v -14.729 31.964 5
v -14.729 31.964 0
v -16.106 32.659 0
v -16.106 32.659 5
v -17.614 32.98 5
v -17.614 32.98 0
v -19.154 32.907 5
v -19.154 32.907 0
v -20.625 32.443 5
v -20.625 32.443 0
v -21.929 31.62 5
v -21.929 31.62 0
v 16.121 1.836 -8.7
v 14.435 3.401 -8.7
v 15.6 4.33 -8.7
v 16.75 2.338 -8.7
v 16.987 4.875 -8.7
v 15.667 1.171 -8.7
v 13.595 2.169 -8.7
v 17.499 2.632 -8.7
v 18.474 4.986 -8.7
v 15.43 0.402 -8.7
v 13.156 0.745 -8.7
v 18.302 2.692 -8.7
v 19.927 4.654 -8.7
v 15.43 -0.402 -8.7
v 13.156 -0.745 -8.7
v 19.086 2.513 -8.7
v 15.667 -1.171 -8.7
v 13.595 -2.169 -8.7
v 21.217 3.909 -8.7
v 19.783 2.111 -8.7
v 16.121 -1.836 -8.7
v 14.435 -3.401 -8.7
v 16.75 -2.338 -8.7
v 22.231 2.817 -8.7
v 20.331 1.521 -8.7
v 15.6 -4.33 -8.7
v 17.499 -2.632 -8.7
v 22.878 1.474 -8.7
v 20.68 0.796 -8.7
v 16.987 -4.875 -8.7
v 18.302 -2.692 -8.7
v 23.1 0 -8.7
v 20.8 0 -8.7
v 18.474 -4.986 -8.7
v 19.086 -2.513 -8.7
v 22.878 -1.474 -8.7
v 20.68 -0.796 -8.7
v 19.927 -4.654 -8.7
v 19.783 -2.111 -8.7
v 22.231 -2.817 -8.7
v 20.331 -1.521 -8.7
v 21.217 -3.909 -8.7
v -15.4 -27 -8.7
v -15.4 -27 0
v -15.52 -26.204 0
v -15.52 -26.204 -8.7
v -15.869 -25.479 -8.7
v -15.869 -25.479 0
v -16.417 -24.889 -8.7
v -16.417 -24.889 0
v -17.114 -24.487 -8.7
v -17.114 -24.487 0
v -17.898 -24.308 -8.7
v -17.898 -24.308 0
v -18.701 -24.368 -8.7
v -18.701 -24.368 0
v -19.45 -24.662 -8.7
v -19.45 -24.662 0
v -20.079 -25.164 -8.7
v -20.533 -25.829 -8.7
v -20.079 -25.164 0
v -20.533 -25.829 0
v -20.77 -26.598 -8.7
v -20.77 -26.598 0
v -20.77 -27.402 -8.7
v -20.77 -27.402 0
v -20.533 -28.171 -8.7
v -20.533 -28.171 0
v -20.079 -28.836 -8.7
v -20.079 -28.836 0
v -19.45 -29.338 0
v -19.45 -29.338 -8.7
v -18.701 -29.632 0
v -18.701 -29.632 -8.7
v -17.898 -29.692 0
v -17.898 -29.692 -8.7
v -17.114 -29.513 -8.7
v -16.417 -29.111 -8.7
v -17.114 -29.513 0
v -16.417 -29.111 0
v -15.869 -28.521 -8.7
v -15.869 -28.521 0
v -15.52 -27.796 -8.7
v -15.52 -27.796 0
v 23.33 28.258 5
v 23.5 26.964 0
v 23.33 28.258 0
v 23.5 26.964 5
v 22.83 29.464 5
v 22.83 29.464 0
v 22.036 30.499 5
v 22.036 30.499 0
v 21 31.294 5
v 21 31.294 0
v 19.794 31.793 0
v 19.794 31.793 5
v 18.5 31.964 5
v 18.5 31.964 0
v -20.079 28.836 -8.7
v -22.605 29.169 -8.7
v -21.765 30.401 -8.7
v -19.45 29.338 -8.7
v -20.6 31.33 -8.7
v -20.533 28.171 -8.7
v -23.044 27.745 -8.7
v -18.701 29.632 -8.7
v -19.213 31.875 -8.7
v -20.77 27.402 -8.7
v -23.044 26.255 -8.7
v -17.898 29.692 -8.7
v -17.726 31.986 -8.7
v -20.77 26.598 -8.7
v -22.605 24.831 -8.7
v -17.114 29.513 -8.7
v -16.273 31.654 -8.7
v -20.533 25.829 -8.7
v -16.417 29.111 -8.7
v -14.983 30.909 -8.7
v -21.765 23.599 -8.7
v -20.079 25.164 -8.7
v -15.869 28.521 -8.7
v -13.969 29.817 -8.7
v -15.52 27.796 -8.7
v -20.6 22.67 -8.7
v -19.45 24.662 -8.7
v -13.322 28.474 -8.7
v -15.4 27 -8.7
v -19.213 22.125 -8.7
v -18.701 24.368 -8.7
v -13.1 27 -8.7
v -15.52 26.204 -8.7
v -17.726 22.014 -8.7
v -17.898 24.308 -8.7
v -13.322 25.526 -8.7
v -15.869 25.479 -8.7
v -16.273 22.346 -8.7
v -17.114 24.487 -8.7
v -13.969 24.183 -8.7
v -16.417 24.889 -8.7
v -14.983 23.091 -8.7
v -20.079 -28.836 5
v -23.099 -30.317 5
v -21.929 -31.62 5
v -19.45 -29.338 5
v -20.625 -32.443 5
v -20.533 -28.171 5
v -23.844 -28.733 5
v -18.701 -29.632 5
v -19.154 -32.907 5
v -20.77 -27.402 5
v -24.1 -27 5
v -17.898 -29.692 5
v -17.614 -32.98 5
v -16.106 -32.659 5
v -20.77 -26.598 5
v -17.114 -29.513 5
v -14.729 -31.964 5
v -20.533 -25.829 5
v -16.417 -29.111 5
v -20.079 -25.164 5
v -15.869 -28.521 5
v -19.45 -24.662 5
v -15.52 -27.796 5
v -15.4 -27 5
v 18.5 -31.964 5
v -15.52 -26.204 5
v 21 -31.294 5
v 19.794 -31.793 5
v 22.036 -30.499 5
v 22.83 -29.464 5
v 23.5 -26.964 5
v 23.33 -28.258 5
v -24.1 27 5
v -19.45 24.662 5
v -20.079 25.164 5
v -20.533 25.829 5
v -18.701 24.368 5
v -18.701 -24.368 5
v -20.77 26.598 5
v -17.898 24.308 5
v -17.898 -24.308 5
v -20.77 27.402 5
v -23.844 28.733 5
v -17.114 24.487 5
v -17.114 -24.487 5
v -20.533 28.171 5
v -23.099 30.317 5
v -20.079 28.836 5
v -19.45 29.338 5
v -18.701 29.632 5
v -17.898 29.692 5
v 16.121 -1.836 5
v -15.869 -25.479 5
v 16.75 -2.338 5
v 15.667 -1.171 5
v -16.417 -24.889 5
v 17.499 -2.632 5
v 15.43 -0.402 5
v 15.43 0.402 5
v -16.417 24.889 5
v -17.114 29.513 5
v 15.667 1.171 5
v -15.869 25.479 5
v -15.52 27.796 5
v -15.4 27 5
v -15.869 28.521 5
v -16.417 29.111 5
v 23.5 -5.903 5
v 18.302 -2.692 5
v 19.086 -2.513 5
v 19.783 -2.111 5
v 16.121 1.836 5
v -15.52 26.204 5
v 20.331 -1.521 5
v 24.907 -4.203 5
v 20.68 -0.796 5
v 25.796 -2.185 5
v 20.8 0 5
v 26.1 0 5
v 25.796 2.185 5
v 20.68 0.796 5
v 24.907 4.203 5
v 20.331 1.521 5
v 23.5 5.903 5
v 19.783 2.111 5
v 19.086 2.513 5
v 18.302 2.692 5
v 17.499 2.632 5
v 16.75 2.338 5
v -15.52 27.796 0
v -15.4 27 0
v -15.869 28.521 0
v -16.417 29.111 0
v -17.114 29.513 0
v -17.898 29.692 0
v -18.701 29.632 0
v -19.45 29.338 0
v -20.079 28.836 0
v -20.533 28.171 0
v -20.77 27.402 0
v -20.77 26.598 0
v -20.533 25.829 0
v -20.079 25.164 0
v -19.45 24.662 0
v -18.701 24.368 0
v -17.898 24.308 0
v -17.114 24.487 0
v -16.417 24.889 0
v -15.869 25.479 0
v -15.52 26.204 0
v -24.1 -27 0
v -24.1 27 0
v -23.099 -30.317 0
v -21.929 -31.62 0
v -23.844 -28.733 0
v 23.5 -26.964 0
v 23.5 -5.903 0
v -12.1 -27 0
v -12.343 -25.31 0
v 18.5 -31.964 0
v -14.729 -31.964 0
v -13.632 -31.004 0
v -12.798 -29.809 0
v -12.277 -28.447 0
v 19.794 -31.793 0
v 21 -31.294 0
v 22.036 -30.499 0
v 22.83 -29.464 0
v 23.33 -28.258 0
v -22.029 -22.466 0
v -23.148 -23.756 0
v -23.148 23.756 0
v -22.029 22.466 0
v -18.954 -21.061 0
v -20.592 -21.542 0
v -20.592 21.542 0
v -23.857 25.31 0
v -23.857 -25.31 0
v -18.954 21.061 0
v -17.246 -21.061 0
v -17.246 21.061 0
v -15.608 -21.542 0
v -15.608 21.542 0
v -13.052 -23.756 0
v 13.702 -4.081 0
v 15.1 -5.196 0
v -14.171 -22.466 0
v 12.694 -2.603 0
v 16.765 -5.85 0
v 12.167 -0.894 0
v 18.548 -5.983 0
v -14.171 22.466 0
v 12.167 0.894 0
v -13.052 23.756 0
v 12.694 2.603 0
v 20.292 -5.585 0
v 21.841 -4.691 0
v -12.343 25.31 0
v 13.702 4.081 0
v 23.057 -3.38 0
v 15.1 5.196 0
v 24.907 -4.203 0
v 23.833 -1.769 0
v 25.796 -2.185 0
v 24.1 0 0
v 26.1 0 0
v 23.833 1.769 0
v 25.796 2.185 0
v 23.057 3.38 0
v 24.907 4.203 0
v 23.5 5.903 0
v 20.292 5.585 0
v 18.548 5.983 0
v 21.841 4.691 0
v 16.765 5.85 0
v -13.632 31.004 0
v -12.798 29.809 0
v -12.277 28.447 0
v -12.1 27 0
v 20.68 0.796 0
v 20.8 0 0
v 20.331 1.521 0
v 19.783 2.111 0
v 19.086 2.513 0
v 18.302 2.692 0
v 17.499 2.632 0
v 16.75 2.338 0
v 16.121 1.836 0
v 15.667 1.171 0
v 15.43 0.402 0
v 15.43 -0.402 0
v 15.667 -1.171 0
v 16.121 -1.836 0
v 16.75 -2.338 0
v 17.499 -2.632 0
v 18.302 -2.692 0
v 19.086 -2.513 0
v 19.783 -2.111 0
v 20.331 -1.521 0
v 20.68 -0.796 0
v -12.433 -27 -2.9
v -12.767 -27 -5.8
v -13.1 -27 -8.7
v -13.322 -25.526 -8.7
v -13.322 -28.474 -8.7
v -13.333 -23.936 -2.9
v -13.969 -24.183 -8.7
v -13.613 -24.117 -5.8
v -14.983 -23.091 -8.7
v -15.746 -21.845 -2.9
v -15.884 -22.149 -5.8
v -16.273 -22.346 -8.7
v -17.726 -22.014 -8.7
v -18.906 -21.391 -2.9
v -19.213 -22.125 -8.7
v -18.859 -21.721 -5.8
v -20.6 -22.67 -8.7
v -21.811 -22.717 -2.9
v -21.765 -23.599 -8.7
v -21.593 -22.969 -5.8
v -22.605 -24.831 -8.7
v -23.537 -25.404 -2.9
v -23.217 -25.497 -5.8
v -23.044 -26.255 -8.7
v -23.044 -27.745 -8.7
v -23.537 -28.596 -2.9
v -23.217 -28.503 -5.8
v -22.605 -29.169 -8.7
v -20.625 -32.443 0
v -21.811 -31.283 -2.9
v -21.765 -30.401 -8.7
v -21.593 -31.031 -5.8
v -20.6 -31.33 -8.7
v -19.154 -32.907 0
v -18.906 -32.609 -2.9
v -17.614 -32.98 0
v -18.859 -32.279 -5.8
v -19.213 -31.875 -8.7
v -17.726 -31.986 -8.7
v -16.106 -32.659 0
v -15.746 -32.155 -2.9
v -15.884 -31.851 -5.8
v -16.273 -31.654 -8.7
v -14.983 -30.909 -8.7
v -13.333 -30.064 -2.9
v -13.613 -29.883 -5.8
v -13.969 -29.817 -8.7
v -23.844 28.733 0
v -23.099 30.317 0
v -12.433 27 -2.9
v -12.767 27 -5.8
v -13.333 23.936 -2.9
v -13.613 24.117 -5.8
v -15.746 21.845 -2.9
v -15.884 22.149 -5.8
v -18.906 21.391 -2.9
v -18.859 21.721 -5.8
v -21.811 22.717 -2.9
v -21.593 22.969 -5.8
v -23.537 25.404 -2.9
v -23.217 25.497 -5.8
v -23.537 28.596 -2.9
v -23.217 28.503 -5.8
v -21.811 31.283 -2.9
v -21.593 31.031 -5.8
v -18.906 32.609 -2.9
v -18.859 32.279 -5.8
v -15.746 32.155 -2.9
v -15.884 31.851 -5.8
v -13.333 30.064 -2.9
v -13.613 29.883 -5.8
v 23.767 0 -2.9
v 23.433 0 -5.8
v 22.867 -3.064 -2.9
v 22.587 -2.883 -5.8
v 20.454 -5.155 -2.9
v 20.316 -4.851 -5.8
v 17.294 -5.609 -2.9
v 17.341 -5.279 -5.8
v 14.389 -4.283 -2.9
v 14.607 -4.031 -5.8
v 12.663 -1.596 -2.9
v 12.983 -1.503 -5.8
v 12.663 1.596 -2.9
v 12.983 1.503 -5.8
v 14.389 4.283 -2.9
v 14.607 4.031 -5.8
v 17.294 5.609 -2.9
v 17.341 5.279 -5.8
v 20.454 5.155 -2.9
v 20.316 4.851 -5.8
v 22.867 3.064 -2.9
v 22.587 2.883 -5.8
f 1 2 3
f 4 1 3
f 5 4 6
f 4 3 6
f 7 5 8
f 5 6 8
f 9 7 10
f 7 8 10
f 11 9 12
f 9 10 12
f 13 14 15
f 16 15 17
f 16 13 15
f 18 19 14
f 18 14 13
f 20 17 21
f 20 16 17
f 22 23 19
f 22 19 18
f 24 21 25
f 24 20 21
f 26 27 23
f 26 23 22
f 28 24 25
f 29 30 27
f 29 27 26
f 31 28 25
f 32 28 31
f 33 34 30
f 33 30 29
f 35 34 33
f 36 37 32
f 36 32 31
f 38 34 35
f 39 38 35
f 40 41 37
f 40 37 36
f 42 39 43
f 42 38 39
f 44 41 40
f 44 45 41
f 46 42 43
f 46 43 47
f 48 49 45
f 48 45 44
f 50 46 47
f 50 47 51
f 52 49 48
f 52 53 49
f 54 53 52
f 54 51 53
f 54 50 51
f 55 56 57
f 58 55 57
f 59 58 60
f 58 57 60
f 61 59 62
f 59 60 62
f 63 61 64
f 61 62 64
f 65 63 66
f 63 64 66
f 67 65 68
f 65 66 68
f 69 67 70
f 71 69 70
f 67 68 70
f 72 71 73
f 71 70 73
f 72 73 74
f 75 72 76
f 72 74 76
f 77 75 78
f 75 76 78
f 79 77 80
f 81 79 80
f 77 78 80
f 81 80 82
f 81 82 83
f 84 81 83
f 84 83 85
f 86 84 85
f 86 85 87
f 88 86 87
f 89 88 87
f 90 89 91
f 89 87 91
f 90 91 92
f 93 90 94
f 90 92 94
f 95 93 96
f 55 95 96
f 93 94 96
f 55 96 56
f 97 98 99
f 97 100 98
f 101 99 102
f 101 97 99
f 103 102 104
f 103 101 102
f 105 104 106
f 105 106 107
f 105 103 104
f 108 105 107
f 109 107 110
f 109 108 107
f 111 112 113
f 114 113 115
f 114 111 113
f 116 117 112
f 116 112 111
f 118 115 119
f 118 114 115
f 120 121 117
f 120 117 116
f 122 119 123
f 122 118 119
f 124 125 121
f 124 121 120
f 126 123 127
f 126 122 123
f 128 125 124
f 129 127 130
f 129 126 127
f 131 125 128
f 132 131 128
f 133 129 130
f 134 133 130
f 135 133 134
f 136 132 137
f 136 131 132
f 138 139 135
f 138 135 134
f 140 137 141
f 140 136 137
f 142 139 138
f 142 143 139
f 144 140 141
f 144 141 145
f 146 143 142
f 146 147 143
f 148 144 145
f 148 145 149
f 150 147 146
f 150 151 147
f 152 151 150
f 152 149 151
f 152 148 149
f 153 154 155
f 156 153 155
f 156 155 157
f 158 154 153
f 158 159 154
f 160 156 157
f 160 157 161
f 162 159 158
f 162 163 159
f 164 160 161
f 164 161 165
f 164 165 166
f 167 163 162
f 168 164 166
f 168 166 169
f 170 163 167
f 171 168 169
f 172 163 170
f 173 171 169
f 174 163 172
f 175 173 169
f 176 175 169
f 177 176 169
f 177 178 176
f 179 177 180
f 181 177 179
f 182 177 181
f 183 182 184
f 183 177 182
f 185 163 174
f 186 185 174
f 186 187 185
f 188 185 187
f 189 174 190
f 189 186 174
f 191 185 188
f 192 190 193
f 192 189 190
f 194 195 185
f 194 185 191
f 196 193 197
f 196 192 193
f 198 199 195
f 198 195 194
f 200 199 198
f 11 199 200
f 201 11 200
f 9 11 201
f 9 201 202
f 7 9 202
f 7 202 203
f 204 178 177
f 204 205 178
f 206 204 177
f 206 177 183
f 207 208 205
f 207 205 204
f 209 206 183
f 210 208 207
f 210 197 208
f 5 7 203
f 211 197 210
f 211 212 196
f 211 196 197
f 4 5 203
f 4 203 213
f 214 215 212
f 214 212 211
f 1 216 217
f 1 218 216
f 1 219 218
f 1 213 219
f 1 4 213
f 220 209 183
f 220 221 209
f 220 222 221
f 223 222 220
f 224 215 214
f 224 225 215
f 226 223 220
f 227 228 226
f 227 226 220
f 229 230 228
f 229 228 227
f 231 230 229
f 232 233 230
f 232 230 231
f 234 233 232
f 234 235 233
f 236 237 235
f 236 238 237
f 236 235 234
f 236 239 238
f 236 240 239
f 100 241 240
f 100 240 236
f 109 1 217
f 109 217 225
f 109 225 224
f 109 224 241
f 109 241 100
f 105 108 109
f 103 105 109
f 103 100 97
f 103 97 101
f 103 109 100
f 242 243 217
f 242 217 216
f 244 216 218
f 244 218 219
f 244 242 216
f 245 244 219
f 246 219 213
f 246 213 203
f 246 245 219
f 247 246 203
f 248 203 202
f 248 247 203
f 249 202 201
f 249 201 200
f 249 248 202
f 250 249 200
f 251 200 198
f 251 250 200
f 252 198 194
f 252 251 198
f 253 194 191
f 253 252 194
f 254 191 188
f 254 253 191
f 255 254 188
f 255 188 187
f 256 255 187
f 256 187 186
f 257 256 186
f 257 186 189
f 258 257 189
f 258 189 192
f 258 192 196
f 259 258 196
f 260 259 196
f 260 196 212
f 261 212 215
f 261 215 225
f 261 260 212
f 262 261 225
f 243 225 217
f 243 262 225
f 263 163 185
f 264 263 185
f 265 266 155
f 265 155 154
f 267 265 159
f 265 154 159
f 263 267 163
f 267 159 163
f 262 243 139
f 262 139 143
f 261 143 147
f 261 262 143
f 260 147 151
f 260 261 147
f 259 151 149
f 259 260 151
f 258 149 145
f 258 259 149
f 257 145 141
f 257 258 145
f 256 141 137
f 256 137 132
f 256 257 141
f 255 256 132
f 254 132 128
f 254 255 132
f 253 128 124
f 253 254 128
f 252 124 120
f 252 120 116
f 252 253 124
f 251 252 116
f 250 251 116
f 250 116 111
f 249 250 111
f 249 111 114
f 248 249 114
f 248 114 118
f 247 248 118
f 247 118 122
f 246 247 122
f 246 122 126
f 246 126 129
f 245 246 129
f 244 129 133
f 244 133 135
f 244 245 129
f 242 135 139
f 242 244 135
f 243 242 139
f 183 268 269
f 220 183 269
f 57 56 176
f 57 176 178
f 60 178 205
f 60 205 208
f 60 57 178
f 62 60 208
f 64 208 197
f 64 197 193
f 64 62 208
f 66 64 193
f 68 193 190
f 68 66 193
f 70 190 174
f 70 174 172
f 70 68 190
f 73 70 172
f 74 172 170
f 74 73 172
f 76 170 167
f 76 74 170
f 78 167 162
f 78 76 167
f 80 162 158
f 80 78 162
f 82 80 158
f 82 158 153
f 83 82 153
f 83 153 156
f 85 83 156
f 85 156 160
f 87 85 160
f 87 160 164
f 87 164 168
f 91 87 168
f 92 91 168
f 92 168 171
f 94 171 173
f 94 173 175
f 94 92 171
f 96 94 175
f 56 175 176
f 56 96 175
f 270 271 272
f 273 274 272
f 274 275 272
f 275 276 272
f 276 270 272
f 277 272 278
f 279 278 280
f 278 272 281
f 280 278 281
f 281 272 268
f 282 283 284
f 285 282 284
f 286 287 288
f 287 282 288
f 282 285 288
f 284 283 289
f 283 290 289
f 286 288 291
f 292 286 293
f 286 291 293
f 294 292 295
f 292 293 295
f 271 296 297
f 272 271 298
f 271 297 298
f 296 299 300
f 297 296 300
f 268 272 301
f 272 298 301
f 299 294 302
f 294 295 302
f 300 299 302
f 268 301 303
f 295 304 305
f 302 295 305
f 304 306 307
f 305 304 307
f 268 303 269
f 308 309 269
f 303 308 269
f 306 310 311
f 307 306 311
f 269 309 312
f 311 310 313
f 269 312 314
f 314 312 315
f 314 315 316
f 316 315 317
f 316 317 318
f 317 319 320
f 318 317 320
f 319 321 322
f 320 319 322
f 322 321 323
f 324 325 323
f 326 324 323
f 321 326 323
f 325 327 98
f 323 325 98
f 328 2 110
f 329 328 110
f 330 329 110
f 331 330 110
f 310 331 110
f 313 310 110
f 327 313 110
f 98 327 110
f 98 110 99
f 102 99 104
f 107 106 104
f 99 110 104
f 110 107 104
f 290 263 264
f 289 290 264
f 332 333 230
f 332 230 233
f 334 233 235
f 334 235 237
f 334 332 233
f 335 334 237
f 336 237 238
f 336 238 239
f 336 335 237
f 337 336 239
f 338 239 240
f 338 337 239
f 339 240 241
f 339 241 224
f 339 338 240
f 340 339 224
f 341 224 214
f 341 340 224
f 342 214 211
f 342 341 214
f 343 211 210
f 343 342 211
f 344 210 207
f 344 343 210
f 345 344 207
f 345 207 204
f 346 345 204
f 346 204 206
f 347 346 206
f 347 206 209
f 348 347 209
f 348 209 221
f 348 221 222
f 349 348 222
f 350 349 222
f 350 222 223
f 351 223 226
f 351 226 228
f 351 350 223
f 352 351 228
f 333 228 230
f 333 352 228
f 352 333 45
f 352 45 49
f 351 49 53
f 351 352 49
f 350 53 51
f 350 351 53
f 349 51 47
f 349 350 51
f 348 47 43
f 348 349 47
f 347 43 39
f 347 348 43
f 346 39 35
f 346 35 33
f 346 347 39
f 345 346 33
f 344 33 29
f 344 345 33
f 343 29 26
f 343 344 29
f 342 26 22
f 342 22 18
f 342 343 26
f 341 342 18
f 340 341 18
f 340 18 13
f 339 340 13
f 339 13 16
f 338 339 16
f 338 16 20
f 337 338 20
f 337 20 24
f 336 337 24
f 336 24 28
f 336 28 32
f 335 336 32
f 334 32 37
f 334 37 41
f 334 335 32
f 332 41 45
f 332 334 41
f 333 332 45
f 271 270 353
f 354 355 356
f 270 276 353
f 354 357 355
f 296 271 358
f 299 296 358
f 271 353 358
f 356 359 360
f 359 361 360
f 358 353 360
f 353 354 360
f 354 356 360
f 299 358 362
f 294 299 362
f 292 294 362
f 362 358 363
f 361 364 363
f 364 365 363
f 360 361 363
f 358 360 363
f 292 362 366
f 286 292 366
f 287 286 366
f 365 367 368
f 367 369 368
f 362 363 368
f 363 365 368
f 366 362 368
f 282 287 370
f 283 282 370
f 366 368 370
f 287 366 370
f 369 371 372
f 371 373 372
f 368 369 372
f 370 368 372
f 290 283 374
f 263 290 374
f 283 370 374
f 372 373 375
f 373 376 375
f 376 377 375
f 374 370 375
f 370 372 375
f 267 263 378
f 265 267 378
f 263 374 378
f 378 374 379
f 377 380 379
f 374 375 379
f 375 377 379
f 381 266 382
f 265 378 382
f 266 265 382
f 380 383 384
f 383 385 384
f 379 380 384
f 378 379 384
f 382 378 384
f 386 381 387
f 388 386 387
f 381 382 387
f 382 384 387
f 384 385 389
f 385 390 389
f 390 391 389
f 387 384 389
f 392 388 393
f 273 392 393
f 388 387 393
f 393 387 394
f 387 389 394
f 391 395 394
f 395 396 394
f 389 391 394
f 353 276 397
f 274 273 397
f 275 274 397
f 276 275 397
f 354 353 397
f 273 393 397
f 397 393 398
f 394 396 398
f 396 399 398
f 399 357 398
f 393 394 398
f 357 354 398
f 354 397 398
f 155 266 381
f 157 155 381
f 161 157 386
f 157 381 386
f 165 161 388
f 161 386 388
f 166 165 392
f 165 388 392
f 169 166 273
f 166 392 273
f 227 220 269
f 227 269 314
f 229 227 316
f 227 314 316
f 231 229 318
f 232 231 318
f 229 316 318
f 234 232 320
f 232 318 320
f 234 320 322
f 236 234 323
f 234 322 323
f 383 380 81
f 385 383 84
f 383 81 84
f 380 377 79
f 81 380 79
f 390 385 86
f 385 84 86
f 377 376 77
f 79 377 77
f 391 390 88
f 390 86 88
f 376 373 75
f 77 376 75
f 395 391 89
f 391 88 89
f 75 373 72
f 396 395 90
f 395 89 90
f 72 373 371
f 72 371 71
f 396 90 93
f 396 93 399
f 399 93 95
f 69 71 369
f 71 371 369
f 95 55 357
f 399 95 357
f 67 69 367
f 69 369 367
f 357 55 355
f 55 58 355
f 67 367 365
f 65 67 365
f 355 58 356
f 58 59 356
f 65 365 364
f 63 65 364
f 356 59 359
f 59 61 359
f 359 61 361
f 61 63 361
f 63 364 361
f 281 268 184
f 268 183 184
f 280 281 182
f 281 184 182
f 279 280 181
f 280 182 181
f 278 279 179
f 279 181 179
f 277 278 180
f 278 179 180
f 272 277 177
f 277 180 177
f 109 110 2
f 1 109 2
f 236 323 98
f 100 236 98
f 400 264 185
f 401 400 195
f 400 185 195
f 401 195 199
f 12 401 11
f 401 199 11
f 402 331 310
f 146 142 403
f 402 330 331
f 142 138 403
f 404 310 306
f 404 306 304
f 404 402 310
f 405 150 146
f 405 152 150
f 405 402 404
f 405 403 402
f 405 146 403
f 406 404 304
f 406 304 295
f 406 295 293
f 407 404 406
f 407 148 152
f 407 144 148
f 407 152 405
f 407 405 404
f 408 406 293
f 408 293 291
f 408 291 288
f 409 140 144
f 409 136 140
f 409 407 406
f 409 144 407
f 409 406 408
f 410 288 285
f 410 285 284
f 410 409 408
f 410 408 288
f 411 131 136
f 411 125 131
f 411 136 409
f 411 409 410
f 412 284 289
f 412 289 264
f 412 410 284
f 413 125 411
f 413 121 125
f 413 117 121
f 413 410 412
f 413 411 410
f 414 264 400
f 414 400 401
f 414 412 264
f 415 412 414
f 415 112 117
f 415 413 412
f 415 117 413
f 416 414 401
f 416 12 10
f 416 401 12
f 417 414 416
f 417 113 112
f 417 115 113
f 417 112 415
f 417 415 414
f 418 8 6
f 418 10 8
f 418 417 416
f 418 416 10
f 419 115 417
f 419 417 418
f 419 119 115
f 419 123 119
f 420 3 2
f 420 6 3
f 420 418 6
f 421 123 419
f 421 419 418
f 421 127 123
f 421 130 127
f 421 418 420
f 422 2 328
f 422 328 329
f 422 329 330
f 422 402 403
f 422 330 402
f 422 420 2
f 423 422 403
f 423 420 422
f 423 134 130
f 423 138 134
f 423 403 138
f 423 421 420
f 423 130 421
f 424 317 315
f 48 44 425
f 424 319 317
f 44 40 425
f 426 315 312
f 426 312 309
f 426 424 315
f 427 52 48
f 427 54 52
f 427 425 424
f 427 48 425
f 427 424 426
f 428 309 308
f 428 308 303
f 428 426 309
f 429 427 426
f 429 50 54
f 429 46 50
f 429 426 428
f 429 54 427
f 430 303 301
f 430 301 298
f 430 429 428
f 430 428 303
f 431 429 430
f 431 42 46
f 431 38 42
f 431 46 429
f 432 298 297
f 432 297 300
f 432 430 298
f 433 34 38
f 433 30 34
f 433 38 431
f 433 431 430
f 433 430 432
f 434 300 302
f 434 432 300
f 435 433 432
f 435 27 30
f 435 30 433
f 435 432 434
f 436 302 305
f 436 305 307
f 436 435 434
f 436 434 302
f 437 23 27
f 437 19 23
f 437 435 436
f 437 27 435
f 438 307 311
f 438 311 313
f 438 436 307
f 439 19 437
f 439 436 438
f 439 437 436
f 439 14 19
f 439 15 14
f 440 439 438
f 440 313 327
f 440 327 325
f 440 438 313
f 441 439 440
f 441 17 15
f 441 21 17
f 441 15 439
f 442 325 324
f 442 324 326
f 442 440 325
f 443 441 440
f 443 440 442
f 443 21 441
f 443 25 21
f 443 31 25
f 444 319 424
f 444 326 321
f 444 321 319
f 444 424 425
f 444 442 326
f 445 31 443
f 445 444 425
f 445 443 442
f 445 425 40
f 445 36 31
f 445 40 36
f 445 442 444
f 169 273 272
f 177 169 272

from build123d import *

# Parameters (mm, degrees)
SKETCH_1_R          = 2.2
SKETCH_1_R_2        = 2.7
EXTRUDE_1_DEPTH     = 5
CUT_EXTRUDE_1_REACH = 59.46
EXTRUDE_START       = -5
SKETCH_6_R          = 2.7
EXTRUDE_3_DEPTH     = 5
FILLET_1_R          = 5


with BuildPart() as part:
    # 草图1 → 凸台-拉伸1 (new body)
    with BuildSketch(Plane.XY):
        with BuildLine():
            Line((-21.928513003, 31.619793089), (-45, 12.5))
            Line((-45, 12.5), (-45, -12.5))
            Line((-45, -12.5), (-21.928513003, -31.619793089))
            ThreePointArc((-21.928513003, -31.619793089), (-18.386291168, -32.993165888), (-14.729286549, -31.963697294))
            Line((-14.729286549, -31.963697294), (22.594284602, -6.618263059))
            ThreePointArc((22.594284602, -6.618263059), (26.1, 0), (22.594284602, 6.618263059))
            Line((22.594284602, 6.618263059), (-14.729286549, 31.963697294))
            ThreePointArc((-14.729286549, 31.963697294), (-18.386291168, 32.993165888), (-21.928513003, 31.619793089))
        make_face()
        with Locations((-34.1, 0)):
            Circle(SKETCH_1_R, mode=Mode.SUBTRACT)
        with Locations((-18.1, 27)):
            Circle(SKETCH_1_R_2, mode=Mode.SUBTRACT)
        with Locations((-18.1, -27)):
            Circle(SKETCH_1_R_2, mode=Mode.SUBTRACT)
        with Locations((18.1, 0)):
            Circle(SKETCH_1_R_2, mode=Mode.SUBTRACT)
    extrude(amount=EXTRUDE_1_DEPTH)

    # 草图4 → 旋转1 (revolve)
    with BuildSketch(Plane(origin=(-24.93598604, 16.933358057, 0), x_dir=(0, 0, -1), z_dir=(0.8272828823621655, -0.5617855752425007, 0)), mode=Mode.PRIVATE) as revolve_1_sk:
        Polygon((8.7, 17.168318912), (8.7, 14.868318912), (0, 14.868318912), (0, 18.168318912), align=None)
    revolve_1 = revolve(revolve_1_sk.sketch.rotate(Axis((-18.1, 27, 1000.278995542), (0, 0, -1)), 55.820627671), axis=Axis((-18.1, 27, 1000.278995542), (0, 0, -1)))

    # 镜向1: 旋转1 across plane
    add(revolve_1.mirror(Plane.ZX))

    # 草图5 → 切除-拉伸1 (cut, up to next)
    with BuildSketch(Plane.XY.offset(5), mode=Mode.PRIVATE) as cut_extrude_1_sk1:
        with BuildLine():
            Line((-24.1, -27), (-24.1, 27))
            ThreePointArc((-24.1, 27), (-23.53005884, 29.552344215), (-21.928513003, 31.619793089))
            Line((-21.928513003, 31.619793089), (-45, 12.5))
            Line((-45, 12.5), (-45, -12.5))
            Line((-45, -12.5), (-21.928513003, -31.619793089))
            ThreePointArc((-21.928513003, -31.619793089), (-23.53005884, -29.552344215), (-24.1, -27))
        make_face()
    cut_extrude_1_tool1 = extrude(cut_extrude_1_sk1.sketch, amount=-CUT_EXTRUDE_1_REACH, mode=Mode.PRIVATE) & part.part
    add(cut_extrude_1_tool1.solids().sort_by_distance((-33.100815, 0, 5))[0], mode=Mode.SUBTRACT)

    # 草图6 → 凸台-拉伸3 (add)
    with BuildSketch(Plane.XY.offset(5).offset(EXTRUDE_START)):
        Polygon((12.5, -13.473020485), (-14.729286549, -31.963697294), (23.5, -31.963697294), (23.5, 31.963697294), (-14.729286549, 31.963697294), (12.5, 13.473020485), align=None)
        with Locations((18.1, 0)):
            Circle(SKETCH_6_R, mode=Mode.SUBTRACT)
    extrude(amount=EXTRUDE_3_DEPTH)

    # 草图7 → 旋转2 (revolve)
    with BuildSketch(Plane(origin=(6.469864276, 8.674410623, 0), x_dir=(0.8015915013283047, -0.5978721142503927, 0), z_dir=(0.5978721142503927, 0.8015915013283047, 0)), mode=Mode.PRIVATE) as revolve_2_sk:
        Polygon((11.808806174, 8.7), (11.808806174, 0), (8.508806174, 0), (9.508806174, 8.7), align=None)
    revolve(revolve_2_sk.sketch.rotate(Axis((18.1, 0, 1), (0, 0, -1)), 143.282349417), axis=Axis((18.1, 0, 1), (0, 0, -1)))

    # 圆角1
    fillet_1_edges = [part.edges().sort_by_distance(p)[0] for p in [
        (23.5, 31.963697294, 2.5),
        (23.5, -31.963697294, 2.5),
    ]]
    fillet(fillet_1_edges, radius=FILLET_1_R)


solid = part.part
